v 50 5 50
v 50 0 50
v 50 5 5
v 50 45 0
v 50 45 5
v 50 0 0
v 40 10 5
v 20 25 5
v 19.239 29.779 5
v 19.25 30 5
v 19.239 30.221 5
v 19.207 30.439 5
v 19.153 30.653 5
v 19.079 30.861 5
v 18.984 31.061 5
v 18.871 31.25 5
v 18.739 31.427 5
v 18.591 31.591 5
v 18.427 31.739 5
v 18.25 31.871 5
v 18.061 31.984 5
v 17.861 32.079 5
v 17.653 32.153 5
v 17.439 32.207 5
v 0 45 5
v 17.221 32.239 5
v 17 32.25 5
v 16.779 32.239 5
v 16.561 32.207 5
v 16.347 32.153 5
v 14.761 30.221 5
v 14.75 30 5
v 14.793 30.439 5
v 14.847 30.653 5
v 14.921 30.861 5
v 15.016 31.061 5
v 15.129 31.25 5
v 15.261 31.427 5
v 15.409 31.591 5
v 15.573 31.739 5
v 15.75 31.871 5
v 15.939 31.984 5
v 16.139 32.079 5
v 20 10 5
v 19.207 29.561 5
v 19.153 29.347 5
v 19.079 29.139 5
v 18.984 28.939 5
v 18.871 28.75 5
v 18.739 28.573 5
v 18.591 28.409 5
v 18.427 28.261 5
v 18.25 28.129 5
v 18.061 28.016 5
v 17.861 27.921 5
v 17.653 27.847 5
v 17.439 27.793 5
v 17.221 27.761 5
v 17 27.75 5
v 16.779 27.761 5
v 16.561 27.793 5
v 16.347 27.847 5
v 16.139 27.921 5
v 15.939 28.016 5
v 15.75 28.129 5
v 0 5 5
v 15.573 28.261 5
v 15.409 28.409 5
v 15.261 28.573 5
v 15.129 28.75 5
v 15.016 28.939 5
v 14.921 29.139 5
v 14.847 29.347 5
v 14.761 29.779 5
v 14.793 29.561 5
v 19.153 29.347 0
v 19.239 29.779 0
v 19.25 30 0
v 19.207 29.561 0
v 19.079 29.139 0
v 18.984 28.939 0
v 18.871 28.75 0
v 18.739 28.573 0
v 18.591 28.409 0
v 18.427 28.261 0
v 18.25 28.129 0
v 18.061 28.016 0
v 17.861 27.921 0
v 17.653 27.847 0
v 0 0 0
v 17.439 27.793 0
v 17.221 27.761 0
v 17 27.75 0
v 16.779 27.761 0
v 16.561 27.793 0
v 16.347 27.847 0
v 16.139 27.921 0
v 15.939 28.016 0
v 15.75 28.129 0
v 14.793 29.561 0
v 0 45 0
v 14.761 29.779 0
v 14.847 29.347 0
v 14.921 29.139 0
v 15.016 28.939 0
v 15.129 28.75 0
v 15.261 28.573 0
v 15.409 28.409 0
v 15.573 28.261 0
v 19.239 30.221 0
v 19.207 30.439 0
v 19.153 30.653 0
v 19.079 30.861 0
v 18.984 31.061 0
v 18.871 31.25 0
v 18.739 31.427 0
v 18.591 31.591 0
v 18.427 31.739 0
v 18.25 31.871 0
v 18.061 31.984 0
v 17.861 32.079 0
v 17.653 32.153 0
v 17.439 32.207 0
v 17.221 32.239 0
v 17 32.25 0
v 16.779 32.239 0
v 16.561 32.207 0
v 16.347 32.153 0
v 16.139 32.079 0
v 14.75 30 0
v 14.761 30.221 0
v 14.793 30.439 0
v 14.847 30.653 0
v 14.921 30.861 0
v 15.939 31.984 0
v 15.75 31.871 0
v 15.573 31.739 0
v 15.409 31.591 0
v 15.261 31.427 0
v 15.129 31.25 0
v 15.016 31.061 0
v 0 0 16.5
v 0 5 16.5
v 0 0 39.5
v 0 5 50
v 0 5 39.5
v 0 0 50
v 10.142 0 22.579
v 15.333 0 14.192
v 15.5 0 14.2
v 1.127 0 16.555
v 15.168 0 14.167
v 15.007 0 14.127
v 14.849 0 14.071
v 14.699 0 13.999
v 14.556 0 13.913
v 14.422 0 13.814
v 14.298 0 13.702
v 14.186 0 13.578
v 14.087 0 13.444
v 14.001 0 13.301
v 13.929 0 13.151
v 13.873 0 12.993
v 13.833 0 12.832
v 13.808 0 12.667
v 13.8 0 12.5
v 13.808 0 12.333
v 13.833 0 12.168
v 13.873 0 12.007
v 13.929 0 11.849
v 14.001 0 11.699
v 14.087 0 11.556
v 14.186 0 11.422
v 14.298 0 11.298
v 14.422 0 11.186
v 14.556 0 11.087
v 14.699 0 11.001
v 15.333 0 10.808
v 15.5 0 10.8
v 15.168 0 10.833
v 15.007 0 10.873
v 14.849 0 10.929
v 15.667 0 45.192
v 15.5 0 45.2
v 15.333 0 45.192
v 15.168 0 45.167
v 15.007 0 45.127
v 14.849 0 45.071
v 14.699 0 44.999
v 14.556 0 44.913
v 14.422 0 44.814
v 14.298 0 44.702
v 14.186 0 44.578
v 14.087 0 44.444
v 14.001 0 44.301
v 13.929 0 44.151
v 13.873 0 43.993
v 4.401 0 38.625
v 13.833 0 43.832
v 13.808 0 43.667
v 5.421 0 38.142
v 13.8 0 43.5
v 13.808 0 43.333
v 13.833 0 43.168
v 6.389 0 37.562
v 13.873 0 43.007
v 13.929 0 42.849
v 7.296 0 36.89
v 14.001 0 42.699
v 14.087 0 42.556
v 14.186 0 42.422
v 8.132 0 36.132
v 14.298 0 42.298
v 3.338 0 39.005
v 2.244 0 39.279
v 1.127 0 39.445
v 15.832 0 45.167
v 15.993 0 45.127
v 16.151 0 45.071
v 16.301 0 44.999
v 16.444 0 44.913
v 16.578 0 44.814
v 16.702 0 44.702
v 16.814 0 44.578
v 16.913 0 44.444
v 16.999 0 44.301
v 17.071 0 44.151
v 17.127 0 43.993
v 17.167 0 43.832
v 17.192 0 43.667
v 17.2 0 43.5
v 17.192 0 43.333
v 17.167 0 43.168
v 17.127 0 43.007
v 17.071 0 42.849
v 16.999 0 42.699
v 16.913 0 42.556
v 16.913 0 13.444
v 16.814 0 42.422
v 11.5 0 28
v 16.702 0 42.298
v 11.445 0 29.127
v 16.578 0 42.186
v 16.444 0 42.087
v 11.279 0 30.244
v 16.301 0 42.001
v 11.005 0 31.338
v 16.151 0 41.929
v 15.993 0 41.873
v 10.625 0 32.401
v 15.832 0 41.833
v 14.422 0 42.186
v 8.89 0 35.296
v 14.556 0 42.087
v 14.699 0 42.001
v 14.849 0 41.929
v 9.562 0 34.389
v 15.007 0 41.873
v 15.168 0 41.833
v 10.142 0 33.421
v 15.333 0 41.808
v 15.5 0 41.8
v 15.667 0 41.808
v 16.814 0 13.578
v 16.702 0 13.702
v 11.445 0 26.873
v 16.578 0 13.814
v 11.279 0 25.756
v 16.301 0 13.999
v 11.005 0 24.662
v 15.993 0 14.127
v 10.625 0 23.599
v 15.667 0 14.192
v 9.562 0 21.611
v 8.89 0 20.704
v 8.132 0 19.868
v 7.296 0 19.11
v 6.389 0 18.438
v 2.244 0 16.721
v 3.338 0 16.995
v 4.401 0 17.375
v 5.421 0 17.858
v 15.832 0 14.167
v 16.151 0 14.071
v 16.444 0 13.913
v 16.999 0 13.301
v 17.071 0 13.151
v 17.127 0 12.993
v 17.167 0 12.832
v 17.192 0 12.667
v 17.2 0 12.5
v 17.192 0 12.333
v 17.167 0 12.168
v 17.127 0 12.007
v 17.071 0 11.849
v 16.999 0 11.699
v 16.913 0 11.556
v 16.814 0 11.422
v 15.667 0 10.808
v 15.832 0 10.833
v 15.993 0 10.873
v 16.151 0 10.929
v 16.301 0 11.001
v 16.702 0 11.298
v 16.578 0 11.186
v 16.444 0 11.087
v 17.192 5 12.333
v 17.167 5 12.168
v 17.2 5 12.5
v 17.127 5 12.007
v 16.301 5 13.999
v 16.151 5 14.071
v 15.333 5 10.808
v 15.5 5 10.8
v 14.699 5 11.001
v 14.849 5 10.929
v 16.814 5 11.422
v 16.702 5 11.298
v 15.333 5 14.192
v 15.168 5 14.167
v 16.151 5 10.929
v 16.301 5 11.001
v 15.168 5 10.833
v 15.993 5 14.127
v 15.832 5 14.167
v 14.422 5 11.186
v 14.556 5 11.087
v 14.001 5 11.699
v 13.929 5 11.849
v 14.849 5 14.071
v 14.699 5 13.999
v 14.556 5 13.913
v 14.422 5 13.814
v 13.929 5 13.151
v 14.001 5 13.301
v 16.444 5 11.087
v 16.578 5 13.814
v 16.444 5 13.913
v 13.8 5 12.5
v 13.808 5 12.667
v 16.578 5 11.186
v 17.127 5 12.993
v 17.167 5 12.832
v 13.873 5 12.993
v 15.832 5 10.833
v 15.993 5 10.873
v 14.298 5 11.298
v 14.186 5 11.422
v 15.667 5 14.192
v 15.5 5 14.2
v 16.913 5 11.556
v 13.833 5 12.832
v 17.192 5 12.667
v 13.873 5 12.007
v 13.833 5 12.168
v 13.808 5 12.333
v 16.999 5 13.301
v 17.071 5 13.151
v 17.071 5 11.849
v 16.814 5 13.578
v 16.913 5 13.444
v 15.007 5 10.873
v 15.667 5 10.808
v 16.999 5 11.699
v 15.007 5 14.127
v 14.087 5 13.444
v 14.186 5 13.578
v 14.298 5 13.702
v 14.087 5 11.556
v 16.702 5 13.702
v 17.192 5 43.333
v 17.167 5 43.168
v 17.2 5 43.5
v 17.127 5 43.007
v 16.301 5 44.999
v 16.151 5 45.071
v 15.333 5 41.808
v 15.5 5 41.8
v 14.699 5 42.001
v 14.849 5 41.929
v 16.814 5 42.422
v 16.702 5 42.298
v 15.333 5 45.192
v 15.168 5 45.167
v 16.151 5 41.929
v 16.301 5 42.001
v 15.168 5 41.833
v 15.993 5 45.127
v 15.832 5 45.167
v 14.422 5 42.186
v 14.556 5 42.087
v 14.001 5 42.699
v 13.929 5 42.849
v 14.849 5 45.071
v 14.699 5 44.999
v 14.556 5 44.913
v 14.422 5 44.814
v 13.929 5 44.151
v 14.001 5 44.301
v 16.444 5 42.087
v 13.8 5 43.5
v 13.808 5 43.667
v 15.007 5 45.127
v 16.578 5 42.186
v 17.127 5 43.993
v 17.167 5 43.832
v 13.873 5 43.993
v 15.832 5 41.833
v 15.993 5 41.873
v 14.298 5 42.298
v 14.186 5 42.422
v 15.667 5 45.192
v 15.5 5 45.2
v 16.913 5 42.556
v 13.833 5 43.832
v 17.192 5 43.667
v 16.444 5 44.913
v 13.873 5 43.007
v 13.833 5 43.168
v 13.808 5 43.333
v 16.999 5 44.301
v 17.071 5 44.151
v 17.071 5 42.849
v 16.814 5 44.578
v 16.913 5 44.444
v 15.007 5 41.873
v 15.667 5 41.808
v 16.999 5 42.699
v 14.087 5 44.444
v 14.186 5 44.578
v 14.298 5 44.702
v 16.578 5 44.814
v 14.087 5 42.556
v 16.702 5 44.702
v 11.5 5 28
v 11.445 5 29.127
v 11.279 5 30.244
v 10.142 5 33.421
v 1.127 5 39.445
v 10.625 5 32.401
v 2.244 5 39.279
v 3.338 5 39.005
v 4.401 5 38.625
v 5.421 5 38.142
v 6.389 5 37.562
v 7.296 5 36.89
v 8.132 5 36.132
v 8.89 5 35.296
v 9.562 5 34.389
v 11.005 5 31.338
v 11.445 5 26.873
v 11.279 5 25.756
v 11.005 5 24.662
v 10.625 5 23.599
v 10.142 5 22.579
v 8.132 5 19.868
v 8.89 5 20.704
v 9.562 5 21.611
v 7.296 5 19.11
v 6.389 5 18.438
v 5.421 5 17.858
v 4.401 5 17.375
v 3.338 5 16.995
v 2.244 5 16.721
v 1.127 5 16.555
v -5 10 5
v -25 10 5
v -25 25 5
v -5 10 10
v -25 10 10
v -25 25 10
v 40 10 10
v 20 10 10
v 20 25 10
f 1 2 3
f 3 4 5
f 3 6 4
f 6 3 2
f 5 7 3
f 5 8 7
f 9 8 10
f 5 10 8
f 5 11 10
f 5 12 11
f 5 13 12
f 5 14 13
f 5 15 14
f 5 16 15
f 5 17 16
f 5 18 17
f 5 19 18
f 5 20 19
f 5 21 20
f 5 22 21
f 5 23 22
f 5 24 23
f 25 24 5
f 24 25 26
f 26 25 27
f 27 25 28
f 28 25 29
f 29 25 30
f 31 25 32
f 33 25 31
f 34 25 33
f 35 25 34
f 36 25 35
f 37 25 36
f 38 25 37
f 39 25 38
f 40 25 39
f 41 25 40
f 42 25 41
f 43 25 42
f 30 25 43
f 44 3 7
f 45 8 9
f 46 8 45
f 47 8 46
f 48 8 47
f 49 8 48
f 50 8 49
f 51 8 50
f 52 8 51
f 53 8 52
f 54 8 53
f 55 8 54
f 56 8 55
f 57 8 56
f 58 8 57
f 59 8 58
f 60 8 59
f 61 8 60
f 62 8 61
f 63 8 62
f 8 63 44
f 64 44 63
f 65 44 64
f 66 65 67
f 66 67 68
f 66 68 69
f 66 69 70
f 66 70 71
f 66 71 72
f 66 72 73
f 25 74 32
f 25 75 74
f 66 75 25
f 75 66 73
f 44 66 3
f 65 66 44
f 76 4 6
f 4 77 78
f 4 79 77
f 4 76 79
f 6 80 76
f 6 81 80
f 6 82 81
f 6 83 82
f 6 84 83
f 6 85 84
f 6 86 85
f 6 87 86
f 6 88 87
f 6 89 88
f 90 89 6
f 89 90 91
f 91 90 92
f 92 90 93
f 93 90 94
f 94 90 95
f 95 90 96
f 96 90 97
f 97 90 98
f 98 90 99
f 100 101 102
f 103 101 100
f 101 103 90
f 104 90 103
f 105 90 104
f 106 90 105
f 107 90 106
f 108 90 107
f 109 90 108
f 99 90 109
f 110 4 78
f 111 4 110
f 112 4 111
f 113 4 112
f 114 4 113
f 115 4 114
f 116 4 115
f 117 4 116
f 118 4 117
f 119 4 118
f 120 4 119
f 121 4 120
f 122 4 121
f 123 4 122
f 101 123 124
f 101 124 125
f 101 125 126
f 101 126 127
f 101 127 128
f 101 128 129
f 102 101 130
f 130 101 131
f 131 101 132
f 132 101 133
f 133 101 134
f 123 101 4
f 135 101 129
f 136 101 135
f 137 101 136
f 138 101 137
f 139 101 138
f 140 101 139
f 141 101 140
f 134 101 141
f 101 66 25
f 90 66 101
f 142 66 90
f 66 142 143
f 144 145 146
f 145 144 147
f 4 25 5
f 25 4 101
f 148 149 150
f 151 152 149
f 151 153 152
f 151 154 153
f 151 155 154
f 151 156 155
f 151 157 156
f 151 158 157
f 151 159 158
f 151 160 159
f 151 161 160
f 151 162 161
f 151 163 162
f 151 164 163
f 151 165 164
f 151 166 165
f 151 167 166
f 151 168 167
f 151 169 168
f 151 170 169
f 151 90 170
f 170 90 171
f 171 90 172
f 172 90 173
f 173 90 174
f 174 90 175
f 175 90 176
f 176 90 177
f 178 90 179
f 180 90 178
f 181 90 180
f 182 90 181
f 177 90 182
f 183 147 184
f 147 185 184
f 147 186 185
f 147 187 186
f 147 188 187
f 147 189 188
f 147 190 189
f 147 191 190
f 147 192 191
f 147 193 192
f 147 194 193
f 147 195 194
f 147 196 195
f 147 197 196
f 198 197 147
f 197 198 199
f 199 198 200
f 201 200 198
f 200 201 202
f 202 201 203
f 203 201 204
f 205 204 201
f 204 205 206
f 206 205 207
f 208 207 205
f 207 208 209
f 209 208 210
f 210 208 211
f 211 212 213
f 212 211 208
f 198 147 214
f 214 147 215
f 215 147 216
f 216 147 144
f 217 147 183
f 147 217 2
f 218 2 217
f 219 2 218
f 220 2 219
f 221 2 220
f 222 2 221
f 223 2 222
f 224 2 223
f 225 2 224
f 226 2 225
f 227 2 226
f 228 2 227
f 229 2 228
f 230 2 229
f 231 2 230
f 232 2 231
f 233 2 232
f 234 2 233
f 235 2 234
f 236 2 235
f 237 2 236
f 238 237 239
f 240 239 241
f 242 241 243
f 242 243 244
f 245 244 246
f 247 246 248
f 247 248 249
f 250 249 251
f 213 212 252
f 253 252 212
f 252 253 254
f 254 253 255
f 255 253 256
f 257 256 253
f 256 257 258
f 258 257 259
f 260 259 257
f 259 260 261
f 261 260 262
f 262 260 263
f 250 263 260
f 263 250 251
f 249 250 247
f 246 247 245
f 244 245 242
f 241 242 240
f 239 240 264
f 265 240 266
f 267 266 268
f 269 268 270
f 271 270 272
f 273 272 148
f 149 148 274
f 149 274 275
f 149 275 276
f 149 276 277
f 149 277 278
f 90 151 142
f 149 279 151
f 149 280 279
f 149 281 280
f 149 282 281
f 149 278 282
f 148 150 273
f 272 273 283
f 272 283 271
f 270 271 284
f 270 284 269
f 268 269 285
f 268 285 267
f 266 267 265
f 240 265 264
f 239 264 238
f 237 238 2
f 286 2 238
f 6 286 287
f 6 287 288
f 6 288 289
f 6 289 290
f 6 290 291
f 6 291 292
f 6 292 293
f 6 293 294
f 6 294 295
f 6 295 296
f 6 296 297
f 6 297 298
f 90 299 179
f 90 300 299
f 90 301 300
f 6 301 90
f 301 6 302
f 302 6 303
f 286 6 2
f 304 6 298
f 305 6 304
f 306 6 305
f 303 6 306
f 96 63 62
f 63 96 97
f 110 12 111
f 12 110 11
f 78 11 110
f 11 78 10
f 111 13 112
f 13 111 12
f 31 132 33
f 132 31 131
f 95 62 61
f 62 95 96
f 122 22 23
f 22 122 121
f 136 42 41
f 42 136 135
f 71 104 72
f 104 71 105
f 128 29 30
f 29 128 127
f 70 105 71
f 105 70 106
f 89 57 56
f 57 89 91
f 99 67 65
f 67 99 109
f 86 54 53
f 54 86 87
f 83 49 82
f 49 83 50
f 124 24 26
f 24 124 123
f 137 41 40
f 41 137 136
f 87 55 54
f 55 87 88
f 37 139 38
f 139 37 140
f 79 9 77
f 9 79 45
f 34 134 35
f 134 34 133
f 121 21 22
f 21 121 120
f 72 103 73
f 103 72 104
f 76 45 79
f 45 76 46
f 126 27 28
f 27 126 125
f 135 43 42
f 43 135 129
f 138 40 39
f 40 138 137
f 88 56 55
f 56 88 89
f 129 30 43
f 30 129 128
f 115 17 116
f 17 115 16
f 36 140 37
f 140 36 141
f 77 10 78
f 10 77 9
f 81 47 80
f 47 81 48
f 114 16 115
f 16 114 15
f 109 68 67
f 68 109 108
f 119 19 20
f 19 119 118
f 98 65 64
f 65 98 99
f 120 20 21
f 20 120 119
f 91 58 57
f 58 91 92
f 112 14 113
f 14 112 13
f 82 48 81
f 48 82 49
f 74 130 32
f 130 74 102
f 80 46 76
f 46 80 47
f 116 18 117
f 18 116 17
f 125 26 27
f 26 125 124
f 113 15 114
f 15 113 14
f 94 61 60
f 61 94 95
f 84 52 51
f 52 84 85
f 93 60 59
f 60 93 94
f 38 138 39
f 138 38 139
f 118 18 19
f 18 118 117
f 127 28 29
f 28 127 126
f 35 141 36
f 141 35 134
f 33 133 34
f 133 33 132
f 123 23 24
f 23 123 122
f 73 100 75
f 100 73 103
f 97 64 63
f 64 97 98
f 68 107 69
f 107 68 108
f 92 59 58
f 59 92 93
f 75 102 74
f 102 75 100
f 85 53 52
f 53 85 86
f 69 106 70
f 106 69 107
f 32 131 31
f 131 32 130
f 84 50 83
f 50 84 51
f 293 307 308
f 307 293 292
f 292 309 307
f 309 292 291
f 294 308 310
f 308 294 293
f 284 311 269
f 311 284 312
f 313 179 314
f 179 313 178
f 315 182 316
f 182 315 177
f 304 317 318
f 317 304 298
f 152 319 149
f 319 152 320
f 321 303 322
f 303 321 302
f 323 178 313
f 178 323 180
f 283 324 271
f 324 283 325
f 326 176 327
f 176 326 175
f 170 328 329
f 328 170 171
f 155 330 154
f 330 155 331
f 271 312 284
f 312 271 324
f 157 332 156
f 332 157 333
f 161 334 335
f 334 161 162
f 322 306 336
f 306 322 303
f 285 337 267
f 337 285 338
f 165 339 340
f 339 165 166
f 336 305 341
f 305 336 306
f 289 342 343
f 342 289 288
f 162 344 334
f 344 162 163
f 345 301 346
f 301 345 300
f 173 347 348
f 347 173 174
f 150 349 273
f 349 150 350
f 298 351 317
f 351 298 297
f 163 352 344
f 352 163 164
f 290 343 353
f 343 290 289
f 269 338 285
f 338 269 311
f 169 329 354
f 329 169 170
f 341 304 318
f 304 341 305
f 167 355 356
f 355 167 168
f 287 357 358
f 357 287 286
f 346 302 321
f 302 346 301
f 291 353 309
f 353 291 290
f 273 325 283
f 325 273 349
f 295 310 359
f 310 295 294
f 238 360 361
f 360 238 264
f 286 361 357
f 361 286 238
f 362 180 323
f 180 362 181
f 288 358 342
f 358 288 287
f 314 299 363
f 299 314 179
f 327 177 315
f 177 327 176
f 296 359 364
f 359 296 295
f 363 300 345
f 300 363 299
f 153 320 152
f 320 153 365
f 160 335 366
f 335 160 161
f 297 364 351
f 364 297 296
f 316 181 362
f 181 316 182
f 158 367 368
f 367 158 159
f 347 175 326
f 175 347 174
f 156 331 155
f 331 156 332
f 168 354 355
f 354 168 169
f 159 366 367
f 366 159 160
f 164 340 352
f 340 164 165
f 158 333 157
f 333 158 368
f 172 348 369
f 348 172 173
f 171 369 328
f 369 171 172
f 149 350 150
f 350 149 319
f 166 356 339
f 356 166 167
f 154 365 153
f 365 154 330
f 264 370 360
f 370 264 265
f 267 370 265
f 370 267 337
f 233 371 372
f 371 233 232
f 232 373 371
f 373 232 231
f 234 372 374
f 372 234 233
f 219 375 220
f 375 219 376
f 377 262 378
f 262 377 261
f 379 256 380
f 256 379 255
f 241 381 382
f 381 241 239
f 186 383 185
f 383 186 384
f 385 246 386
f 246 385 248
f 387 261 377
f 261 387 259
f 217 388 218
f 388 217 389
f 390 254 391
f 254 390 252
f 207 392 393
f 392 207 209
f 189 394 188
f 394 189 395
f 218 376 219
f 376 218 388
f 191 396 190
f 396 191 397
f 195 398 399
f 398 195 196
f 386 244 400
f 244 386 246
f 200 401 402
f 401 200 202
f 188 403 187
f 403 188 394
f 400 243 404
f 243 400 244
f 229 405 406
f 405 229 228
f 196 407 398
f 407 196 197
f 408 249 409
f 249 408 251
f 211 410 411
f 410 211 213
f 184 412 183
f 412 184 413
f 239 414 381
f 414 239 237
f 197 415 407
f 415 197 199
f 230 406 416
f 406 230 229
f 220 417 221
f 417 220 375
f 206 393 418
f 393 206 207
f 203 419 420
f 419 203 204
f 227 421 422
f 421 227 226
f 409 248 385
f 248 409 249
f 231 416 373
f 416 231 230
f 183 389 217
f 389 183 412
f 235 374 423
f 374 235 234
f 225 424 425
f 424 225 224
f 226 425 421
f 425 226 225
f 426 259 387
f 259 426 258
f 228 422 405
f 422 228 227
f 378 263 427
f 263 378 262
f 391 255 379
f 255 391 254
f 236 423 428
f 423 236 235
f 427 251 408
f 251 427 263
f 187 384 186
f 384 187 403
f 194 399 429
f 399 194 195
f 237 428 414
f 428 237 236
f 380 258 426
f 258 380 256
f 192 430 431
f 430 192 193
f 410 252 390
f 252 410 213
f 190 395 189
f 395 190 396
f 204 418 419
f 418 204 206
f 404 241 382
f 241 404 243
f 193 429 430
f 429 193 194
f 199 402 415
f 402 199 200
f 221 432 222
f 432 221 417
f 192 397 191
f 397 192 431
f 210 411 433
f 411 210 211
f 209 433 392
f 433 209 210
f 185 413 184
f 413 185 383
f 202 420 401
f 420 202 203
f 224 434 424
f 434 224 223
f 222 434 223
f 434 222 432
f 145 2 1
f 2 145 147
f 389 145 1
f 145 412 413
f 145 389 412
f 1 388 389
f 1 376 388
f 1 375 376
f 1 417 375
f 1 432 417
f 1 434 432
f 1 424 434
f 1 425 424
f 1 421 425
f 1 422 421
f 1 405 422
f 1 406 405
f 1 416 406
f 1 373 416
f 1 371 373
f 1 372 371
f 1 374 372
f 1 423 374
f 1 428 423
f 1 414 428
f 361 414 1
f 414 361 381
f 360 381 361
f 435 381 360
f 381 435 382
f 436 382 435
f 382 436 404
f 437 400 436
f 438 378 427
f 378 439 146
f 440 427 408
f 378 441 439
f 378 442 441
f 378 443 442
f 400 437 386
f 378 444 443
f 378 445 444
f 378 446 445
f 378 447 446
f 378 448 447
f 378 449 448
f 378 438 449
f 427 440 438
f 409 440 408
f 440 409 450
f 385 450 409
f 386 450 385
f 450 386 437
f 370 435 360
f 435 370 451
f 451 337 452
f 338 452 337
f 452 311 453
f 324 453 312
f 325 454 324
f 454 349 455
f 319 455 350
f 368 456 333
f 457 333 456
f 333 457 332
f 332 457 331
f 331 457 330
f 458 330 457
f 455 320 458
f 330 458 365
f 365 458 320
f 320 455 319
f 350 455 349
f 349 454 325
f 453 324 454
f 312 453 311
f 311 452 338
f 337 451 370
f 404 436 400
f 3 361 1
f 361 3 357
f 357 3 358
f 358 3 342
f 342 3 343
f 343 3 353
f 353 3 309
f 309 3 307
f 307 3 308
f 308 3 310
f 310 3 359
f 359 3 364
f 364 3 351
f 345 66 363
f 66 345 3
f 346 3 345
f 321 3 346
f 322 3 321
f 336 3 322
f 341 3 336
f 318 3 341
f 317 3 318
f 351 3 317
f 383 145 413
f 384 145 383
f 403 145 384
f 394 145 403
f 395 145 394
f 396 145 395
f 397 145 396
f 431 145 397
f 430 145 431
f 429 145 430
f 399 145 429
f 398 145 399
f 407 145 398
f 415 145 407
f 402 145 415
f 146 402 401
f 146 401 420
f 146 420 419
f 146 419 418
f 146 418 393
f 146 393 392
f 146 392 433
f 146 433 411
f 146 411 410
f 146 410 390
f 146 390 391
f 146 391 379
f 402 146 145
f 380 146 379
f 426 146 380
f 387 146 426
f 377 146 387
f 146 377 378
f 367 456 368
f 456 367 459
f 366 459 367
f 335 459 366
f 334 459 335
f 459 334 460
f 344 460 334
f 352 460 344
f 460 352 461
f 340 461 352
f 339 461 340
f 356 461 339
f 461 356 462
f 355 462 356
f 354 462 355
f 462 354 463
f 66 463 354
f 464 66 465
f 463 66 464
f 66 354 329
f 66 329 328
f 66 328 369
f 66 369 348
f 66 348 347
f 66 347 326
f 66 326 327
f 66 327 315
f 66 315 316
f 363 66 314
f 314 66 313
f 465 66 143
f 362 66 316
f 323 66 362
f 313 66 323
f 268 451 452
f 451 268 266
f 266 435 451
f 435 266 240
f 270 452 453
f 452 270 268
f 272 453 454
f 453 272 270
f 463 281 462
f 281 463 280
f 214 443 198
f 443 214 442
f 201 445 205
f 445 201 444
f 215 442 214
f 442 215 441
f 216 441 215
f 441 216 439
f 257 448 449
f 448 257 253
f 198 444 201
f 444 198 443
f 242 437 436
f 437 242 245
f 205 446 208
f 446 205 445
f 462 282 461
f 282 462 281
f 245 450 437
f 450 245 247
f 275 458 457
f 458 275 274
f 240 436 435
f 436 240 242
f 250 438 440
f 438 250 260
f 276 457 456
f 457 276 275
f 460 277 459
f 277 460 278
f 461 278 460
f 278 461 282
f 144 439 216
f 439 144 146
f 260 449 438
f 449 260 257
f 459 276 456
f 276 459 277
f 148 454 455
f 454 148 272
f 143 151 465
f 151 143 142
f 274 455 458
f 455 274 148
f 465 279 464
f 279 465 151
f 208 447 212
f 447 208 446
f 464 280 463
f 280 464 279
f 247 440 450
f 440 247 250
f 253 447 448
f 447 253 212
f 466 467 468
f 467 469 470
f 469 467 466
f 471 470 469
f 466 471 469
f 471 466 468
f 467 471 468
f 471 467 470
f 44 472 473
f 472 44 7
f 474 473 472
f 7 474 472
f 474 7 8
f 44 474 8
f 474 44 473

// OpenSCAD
// NEMA 17 Stepper Motor L-Bracket for Syringe Pump
// Designed for FDM 3D Printing

// --- Dimensions ---
// Base Plate
base_x_min = -25;
base_x_max = 25;
base_y_min = 0;
base_y_max = 45;
base_z_height = 5;

// Base Plate Holes (M4)
m4_hole_dia = 4.5;
m4_hole_x1 = -17;
m4_hole_y1 = 30;
m4_hole_x2 = 17;
m4_hole_y2 = 30;

// Vertical Motor Plate
motor_plate_x_min = -25;
motor_plate_x_max = 25;
motor_plate_y_min = 0;
motor_plate_y_max = 5;
motor_plate_z_height = 50;

// Motor Boss Hole (Centering)
boss_hole_dia = 23;
boss_hole_x = 0;
boss_hole_z = 28;

// Motor Screw Holes (M3)
m3_hole_dia = 3.4;
m3_pattern_size = 31;

// Gussets
gusset_thickness = 5;
gusset_leg_y = 20;
gusset_leg_z = 20;
gusset_x_left_min = -25;
gusset_x_left_max = -20;
gusset_x_right_min = 20;
gusset_x_right_max = 25;

// Resolution
$fn = 64;

// --- Modeling ---

module gusset() {
    // A right triangle in YZ plane, extruded along X
    // Corner at y=5, z=5. Legs are 20mm.
    // Vertices in YZ: (5,5), (25,5), (5,25)
    polygon(points = [
        [0, 5], 
        [gusset_leg_y, 5], 
        [0, gusset_leg_z]
    ]);
}

union() {
    // 1. Main Base Plate
    difference() {
        cube([base_x_max - base_x_min, base_y_max - base_y_min, base_z_height]);
        
        // M4 Holes (Vertical through holes)
        // We translate to the center of the base plate relative to the origin
        // Since base is -25 to 25, x=0 is center.
        translate([m4_hole_x1, m4_hole_y1, -1])
            cylinder(d = m4_hole_dia, h = base_z_height + 2);
        translate([m4_hole_x2, m4_hole_y2, -1])
            cylinder(d = m4_hole_dia, h = base_z_height + 2);
    }

    // 2. Vertical Motor Plate
    difference() {
        // The plate itself
        cube([base_x_max - base_x_min, motor_plate_y_max - motor_plate_y_min, motor_plate_z_height]);
        
        // Motor Centering Boss Hole (Cut along Y axis)
        // Center is x=0, z=28. Hole is 23mm diameter.
        translate([boss_hole_x, -1, boss_hole_z])
            rotate([-90, 0, 0])
                cylinder(d = boss_hole_dia, h = motor_plate_y_max + 2);
        
        // M3 Screw Holes (4 holes on 31mm square pattern)
        // Pattern is centered on the boss hole (0, 28)
        // Half-pattern is 15.5mm
        for (px = [-m3_pattern_size/2, m3_pattern_size/2]) {
            for (pz = [-m3_pattern_size/2, m3_pattern_size/2]) {
                translate([px, -1, boss_hole_z + pz])
                    rotate([-90, 0, 0])
                        cylinder(d = m3_hole_dia, h = motor_plate_y_max + 2);
            }
        }
    }

    // 3. Gussets
    // Left Gusset
    translate([gusset_x_left_min, 5, 5])
        linear_extrude(height = gusset_thickness)
            gusset();
            
    // Right Gusset
    // Note: The user specified gussets are flush with edges. 
    // Since the plate is -25 to 25, we place them at the edges.
    // We use a trick to mirror/place them correctly.
    translate([gusset_x_right_max - gusset_thickness, 5, 5])
        linear_extrude(height = gusset_thickness)
            gusset();
}

// Note on Gusset Placement: 
// The user requested gussets at x = -25 to -20 and x = 20 to 25.
// My code places the left one at -25 and the right one at 20 (ending at 25).
// This matches the dimensions provided.
